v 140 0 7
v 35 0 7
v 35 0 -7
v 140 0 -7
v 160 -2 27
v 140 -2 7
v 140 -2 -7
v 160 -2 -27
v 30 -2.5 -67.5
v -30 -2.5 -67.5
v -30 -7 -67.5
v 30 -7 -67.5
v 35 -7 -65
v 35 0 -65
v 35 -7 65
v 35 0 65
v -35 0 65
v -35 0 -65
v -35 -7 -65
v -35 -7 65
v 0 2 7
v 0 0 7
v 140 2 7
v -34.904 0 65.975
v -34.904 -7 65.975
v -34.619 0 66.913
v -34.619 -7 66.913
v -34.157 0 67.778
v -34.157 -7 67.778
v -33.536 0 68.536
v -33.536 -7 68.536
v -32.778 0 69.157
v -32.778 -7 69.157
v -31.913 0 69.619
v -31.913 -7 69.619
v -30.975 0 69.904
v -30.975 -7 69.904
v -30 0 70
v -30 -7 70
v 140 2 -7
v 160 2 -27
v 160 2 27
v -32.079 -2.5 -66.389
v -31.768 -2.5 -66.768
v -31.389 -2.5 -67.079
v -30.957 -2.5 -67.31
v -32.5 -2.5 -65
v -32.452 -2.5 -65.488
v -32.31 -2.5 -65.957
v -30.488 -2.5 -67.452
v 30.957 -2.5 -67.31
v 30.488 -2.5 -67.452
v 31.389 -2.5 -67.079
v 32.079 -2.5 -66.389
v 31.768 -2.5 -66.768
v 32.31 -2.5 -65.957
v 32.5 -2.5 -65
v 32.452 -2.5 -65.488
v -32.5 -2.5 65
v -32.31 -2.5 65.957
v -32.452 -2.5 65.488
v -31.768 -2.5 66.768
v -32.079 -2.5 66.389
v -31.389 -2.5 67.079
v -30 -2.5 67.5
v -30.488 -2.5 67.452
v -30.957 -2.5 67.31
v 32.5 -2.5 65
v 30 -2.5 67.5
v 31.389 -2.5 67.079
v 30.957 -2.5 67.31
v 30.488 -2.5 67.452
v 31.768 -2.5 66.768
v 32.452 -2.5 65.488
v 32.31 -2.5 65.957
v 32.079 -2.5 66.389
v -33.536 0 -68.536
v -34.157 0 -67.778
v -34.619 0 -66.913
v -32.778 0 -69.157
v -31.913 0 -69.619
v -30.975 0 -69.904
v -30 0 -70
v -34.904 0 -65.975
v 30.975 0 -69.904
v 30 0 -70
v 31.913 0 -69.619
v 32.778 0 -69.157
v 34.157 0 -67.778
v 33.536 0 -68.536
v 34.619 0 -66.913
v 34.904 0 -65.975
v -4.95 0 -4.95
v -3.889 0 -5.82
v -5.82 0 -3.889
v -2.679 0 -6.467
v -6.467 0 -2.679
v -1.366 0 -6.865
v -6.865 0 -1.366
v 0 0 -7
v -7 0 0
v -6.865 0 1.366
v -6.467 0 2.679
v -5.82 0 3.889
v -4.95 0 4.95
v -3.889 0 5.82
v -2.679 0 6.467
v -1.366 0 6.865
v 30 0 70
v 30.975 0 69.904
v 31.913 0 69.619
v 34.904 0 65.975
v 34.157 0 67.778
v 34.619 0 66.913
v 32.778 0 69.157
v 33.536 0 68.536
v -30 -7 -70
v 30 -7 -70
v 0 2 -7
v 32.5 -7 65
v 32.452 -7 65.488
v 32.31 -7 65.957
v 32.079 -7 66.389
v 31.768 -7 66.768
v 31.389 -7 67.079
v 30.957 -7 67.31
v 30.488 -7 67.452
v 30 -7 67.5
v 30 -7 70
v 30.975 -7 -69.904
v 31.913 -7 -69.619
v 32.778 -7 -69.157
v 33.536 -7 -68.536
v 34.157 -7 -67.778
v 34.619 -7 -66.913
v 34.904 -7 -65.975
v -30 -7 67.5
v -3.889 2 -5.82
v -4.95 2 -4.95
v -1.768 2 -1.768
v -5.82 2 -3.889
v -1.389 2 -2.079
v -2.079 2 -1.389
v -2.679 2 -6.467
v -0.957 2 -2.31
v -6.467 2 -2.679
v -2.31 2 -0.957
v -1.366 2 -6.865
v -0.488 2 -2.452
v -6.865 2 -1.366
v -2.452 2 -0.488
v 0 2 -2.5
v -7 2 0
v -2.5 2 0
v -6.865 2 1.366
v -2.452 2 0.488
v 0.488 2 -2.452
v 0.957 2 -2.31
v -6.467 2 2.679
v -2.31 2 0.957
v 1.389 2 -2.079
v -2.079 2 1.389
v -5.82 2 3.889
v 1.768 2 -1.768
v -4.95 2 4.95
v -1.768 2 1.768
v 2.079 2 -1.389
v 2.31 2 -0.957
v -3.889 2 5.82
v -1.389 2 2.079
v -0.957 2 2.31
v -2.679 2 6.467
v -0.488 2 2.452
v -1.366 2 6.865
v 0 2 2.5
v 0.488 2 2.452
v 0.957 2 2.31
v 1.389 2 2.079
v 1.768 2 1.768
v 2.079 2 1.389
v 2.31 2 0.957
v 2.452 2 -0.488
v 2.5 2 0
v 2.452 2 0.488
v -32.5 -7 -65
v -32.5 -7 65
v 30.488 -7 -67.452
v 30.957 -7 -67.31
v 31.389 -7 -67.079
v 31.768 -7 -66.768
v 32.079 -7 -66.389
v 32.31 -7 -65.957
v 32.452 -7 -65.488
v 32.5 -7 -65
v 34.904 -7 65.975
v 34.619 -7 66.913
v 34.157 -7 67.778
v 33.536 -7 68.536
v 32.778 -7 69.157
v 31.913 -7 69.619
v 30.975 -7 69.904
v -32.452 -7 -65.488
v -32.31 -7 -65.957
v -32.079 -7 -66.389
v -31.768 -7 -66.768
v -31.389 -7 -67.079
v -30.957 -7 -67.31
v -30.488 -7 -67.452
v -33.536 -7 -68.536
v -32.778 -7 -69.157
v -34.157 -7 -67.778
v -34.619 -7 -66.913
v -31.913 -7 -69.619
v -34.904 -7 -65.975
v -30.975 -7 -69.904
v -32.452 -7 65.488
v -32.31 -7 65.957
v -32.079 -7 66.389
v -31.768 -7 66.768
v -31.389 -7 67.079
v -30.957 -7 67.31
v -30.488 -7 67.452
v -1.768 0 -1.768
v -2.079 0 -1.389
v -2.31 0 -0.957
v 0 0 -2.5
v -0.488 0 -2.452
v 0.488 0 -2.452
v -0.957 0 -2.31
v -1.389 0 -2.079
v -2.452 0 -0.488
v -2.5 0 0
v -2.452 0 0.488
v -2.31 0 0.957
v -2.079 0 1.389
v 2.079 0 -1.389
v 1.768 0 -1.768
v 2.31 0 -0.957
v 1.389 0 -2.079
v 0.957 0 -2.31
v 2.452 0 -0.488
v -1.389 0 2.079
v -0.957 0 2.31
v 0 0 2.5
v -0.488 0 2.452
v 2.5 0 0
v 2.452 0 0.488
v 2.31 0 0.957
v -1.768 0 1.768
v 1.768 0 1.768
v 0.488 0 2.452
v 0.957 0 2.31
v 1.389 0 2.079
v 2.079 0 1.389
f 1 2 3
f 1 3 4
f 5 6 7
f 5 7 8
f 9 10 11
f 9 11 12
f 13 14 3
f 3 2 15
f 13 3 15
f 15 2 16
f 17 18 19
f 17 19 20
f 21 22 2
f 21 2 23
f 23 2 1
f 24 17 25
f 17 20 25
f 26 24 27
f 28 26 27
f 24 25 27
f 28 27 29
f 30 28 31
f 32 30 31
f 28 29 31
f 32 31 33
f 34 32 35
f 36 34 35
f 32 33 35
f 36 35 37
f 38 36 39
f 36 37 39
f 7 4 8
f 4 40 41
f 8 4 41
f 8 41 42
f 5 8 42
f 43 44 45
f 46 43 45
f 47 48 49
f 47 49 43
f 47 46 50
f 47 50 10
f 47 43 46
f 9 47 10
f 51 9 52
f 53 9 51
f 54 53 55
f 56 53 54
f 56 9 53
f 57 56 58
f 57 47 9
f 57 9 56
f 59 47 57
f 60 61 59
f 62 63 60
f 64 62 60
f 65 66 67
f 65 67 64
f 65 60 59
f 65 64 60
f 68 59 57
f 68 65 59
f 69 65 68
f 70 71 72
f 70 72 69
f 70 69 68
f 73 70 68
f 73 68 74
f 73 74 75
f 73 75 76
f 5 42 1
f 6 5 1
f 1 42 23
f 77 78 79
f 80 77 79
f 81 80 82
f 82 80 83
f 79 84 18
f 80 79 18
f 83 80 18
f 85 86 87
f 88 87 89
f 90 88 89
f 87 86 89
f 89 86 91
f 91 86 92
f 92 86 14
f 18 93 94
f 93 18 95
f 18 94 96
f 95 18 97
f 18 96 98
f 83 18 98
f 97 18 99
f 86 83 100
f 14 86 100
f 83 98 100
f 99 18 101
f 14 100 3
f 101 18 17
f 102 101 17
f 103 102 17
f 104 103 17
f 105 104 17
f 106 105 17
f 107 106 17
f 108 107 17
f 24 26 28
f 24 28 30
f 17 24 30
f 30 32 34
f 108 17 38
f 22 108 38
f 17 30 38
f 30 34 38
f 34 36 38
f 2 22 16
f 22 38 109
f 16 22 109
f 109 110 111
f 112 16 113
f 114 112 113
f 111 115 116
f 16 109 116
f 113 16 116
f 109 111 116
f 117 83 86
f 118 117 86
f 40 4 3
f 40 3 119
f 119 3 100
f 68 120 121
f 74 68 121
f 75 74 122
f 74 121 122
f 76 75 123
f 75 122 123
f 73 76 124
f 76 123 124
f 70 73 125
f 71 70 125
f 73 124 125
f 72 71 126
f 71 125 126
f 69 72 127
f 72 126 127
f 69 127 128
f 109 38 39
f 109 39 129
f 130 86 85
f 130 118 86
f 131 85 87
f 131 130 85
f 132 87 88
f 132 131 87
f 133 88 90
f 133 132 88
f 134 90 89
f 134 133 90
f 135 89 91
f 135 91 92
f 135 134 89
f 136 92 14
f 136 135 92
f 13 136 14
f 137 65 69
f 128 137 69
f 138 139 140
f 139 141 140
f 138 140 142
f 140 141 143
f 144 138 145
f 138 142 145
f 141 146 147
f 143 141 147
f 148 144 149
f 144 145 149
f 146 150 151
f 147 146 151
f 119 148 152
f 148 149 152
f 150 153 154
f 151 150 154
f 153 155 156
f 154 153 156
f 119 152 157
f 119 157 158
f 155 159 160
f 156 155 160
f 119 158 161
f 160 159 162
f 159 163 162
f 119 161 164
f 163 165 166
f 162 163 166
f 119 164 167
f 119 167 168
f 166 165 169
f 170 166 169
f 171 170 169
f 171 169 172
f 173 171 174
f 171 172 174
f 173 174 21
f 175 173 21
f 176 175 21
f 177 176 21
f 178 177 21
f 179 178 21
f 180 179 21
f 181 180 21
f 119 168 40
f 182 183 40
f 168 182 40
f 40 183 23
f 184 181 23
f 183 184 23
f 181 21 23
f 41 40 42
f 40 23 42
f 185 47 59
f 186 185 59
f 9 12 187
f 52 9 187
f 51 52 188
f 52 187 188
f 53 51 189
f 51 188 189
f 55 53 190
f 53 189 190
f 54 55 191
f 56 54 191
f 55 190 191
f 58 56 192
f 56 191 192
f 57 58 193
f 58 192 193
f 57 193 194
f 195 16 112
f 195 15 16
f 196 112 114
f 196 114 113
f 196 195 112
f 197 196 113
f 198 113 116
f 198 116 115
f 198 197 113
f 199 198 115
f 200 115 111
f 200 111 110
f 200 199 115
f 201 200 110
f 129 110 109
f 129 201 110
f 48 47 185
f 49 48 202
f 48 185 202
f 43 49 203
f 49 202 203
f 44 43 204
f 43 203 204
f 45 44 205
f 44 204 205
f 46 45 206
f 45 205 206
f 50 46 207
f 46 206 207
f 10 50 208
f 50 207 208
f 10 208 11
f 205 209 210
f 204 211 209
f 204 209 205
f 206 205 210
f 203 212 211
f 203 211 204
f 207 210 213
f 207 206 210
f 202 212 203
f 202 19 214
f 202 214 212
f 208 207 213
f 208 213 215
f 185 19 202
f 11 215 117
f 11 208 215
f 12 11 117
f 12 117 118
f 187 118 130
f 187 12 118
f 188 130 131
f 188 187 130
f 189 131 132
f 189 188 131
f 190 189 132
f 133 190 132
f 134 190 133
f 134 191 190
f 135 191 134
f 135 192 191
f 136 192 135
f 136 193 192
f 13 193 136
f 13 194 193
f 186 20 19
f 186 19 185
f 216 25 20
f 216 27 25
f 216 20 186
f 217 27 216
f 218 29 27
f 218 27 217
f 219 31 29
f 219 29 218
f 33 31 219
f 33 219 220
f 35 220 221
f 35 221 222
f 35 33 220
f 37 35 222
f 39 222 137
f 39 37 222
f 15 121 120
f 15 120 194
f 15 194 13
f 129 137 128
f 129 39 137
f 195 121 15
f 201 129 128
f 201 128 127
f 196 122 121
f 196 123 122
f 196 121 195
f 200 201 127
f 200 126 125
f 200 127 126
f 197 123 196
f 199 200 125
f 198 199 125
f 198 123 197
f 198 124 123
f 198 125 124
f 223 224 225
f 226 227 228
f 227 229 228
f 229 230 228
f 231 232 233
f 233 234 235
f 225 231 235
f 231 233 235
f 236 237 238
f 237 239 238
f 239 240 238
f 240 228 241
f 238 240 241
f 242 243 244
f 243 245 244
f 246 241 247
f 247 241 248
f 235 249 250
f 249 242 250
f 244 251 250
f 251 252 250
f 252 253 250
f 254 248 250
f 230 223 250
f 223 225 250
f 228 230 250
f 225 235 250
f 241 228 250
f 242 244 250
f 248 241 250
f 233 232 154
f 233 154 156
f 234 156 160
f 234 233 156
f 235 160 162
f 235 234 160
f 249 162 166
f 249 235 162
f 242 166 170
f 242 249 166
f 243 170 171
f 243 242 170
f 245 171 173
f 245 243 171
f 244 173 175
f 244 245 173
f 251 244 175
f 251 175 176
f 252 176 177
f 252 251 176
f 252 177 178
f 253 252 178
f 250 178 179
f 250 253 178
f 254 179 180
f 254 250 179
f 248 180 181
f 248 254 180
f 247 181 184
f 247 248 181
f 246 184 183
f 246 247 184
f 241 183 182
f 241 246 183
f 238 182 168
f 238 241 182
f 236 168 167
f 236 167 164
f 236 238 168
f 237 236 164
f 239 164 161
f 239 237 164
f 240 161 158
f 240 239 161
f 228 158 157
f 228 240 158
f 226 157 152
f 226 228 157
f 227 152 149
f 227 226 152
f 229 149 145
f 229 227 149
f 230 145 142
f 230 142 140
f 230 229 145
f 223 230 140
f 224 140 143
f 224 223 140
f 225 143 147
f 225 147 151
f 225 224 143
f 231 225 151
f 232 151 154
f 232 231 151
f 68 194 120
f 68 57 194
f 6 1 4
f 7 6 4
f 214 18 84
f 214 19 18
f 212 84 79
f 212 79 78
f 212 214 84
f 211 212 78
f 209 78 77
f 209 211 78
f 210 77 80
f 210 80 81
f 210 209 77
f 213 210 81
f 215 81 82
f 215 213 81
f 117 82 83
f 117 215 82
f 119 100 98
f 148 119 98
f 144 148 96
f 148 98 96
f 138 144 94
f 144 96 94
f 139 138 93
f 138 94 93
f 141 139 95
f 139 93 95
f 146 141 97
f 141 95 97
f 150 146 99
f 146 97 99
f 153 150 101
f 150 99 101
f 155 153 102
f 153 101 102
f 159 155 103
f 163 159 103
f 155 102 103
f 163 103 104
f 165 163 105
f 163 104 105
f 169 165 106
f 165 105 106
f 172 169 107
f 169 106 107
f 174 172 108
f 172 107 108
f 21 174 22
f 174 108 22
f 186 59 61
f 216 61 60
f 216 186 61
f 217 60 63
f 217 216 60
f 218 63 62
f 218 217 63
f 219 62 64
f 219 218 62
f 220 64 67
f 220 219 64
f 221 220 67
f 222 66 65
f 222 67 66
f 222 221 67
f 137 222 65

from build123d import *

# Parameters (mm, degrees)
F0_W          = 70
F0_H          = 140
F1_DEPTH      = 7
F2_R          = 5
F3_T          = -2.5
F4_W          = 105
F4_H          = 14
F4_R          = 2.5
F5_DEPTH      = 2
F7_DEPTH      = 2
F7_DEPTH_BACK = 2


with BuildPart() as f1:
    # F0 (on Front) → F1 (new body)
    with BuildSketch(Plane.XZ):
        Rectangle(F0_W, F0_H)
    extrude(amount=F1_DEPTH)

    # F2
    f2_edges = [f1.edges().sort_by_distance(p)[0] for p in [
        (35, -3.5, 70),
        (35, -3.5, -70),
        (-35, -3.5, -70),
        (-35, -3.5, 70),
    ]]
    fillet(f2_edges, radius=F2_R)

    # F3
    f3_openings = [f1.faces().sort_by_distance(p)[0] for p in [
        (0, -7, 0),
    ]]
    offset(amount=F3_T, openings=f3_openings)

    # F4 (on face) → F5 (join)
    with BuildSketch(Plane(origin=(0, 0, 0), x_dir=(-1, 0, 0), z_dir=(0, 1, 0))):
        with Locations((-87.5, 0)):
            Rectangle(F4_W, F4_H)
        with BuildLine():
            Line((-35, -7), (0, -7))
            ThreePointArc((0, -7), (7, 0), (0, 7))
            Line((0, 7), (-35, 7))
            Line((-35, 7), (-35, -7))
        make_face()
        Circle(F4_R, mode=Mode.SUBTRACT)
    extrude(amount=F5_DEPTH)

    # F6 (on face) → F7 (join, two sides)
    with BuildSketch(Plane.XZ) as f7_sk:
        Polygon((160, 27), (140, 7), (140, -7), (160, -27), align=None)
    extrude(amount=-F7_DEPTH)
    extrude(f7_sk.sketch, amount=F7_DEPTH_BACK)


solid = f1.part
